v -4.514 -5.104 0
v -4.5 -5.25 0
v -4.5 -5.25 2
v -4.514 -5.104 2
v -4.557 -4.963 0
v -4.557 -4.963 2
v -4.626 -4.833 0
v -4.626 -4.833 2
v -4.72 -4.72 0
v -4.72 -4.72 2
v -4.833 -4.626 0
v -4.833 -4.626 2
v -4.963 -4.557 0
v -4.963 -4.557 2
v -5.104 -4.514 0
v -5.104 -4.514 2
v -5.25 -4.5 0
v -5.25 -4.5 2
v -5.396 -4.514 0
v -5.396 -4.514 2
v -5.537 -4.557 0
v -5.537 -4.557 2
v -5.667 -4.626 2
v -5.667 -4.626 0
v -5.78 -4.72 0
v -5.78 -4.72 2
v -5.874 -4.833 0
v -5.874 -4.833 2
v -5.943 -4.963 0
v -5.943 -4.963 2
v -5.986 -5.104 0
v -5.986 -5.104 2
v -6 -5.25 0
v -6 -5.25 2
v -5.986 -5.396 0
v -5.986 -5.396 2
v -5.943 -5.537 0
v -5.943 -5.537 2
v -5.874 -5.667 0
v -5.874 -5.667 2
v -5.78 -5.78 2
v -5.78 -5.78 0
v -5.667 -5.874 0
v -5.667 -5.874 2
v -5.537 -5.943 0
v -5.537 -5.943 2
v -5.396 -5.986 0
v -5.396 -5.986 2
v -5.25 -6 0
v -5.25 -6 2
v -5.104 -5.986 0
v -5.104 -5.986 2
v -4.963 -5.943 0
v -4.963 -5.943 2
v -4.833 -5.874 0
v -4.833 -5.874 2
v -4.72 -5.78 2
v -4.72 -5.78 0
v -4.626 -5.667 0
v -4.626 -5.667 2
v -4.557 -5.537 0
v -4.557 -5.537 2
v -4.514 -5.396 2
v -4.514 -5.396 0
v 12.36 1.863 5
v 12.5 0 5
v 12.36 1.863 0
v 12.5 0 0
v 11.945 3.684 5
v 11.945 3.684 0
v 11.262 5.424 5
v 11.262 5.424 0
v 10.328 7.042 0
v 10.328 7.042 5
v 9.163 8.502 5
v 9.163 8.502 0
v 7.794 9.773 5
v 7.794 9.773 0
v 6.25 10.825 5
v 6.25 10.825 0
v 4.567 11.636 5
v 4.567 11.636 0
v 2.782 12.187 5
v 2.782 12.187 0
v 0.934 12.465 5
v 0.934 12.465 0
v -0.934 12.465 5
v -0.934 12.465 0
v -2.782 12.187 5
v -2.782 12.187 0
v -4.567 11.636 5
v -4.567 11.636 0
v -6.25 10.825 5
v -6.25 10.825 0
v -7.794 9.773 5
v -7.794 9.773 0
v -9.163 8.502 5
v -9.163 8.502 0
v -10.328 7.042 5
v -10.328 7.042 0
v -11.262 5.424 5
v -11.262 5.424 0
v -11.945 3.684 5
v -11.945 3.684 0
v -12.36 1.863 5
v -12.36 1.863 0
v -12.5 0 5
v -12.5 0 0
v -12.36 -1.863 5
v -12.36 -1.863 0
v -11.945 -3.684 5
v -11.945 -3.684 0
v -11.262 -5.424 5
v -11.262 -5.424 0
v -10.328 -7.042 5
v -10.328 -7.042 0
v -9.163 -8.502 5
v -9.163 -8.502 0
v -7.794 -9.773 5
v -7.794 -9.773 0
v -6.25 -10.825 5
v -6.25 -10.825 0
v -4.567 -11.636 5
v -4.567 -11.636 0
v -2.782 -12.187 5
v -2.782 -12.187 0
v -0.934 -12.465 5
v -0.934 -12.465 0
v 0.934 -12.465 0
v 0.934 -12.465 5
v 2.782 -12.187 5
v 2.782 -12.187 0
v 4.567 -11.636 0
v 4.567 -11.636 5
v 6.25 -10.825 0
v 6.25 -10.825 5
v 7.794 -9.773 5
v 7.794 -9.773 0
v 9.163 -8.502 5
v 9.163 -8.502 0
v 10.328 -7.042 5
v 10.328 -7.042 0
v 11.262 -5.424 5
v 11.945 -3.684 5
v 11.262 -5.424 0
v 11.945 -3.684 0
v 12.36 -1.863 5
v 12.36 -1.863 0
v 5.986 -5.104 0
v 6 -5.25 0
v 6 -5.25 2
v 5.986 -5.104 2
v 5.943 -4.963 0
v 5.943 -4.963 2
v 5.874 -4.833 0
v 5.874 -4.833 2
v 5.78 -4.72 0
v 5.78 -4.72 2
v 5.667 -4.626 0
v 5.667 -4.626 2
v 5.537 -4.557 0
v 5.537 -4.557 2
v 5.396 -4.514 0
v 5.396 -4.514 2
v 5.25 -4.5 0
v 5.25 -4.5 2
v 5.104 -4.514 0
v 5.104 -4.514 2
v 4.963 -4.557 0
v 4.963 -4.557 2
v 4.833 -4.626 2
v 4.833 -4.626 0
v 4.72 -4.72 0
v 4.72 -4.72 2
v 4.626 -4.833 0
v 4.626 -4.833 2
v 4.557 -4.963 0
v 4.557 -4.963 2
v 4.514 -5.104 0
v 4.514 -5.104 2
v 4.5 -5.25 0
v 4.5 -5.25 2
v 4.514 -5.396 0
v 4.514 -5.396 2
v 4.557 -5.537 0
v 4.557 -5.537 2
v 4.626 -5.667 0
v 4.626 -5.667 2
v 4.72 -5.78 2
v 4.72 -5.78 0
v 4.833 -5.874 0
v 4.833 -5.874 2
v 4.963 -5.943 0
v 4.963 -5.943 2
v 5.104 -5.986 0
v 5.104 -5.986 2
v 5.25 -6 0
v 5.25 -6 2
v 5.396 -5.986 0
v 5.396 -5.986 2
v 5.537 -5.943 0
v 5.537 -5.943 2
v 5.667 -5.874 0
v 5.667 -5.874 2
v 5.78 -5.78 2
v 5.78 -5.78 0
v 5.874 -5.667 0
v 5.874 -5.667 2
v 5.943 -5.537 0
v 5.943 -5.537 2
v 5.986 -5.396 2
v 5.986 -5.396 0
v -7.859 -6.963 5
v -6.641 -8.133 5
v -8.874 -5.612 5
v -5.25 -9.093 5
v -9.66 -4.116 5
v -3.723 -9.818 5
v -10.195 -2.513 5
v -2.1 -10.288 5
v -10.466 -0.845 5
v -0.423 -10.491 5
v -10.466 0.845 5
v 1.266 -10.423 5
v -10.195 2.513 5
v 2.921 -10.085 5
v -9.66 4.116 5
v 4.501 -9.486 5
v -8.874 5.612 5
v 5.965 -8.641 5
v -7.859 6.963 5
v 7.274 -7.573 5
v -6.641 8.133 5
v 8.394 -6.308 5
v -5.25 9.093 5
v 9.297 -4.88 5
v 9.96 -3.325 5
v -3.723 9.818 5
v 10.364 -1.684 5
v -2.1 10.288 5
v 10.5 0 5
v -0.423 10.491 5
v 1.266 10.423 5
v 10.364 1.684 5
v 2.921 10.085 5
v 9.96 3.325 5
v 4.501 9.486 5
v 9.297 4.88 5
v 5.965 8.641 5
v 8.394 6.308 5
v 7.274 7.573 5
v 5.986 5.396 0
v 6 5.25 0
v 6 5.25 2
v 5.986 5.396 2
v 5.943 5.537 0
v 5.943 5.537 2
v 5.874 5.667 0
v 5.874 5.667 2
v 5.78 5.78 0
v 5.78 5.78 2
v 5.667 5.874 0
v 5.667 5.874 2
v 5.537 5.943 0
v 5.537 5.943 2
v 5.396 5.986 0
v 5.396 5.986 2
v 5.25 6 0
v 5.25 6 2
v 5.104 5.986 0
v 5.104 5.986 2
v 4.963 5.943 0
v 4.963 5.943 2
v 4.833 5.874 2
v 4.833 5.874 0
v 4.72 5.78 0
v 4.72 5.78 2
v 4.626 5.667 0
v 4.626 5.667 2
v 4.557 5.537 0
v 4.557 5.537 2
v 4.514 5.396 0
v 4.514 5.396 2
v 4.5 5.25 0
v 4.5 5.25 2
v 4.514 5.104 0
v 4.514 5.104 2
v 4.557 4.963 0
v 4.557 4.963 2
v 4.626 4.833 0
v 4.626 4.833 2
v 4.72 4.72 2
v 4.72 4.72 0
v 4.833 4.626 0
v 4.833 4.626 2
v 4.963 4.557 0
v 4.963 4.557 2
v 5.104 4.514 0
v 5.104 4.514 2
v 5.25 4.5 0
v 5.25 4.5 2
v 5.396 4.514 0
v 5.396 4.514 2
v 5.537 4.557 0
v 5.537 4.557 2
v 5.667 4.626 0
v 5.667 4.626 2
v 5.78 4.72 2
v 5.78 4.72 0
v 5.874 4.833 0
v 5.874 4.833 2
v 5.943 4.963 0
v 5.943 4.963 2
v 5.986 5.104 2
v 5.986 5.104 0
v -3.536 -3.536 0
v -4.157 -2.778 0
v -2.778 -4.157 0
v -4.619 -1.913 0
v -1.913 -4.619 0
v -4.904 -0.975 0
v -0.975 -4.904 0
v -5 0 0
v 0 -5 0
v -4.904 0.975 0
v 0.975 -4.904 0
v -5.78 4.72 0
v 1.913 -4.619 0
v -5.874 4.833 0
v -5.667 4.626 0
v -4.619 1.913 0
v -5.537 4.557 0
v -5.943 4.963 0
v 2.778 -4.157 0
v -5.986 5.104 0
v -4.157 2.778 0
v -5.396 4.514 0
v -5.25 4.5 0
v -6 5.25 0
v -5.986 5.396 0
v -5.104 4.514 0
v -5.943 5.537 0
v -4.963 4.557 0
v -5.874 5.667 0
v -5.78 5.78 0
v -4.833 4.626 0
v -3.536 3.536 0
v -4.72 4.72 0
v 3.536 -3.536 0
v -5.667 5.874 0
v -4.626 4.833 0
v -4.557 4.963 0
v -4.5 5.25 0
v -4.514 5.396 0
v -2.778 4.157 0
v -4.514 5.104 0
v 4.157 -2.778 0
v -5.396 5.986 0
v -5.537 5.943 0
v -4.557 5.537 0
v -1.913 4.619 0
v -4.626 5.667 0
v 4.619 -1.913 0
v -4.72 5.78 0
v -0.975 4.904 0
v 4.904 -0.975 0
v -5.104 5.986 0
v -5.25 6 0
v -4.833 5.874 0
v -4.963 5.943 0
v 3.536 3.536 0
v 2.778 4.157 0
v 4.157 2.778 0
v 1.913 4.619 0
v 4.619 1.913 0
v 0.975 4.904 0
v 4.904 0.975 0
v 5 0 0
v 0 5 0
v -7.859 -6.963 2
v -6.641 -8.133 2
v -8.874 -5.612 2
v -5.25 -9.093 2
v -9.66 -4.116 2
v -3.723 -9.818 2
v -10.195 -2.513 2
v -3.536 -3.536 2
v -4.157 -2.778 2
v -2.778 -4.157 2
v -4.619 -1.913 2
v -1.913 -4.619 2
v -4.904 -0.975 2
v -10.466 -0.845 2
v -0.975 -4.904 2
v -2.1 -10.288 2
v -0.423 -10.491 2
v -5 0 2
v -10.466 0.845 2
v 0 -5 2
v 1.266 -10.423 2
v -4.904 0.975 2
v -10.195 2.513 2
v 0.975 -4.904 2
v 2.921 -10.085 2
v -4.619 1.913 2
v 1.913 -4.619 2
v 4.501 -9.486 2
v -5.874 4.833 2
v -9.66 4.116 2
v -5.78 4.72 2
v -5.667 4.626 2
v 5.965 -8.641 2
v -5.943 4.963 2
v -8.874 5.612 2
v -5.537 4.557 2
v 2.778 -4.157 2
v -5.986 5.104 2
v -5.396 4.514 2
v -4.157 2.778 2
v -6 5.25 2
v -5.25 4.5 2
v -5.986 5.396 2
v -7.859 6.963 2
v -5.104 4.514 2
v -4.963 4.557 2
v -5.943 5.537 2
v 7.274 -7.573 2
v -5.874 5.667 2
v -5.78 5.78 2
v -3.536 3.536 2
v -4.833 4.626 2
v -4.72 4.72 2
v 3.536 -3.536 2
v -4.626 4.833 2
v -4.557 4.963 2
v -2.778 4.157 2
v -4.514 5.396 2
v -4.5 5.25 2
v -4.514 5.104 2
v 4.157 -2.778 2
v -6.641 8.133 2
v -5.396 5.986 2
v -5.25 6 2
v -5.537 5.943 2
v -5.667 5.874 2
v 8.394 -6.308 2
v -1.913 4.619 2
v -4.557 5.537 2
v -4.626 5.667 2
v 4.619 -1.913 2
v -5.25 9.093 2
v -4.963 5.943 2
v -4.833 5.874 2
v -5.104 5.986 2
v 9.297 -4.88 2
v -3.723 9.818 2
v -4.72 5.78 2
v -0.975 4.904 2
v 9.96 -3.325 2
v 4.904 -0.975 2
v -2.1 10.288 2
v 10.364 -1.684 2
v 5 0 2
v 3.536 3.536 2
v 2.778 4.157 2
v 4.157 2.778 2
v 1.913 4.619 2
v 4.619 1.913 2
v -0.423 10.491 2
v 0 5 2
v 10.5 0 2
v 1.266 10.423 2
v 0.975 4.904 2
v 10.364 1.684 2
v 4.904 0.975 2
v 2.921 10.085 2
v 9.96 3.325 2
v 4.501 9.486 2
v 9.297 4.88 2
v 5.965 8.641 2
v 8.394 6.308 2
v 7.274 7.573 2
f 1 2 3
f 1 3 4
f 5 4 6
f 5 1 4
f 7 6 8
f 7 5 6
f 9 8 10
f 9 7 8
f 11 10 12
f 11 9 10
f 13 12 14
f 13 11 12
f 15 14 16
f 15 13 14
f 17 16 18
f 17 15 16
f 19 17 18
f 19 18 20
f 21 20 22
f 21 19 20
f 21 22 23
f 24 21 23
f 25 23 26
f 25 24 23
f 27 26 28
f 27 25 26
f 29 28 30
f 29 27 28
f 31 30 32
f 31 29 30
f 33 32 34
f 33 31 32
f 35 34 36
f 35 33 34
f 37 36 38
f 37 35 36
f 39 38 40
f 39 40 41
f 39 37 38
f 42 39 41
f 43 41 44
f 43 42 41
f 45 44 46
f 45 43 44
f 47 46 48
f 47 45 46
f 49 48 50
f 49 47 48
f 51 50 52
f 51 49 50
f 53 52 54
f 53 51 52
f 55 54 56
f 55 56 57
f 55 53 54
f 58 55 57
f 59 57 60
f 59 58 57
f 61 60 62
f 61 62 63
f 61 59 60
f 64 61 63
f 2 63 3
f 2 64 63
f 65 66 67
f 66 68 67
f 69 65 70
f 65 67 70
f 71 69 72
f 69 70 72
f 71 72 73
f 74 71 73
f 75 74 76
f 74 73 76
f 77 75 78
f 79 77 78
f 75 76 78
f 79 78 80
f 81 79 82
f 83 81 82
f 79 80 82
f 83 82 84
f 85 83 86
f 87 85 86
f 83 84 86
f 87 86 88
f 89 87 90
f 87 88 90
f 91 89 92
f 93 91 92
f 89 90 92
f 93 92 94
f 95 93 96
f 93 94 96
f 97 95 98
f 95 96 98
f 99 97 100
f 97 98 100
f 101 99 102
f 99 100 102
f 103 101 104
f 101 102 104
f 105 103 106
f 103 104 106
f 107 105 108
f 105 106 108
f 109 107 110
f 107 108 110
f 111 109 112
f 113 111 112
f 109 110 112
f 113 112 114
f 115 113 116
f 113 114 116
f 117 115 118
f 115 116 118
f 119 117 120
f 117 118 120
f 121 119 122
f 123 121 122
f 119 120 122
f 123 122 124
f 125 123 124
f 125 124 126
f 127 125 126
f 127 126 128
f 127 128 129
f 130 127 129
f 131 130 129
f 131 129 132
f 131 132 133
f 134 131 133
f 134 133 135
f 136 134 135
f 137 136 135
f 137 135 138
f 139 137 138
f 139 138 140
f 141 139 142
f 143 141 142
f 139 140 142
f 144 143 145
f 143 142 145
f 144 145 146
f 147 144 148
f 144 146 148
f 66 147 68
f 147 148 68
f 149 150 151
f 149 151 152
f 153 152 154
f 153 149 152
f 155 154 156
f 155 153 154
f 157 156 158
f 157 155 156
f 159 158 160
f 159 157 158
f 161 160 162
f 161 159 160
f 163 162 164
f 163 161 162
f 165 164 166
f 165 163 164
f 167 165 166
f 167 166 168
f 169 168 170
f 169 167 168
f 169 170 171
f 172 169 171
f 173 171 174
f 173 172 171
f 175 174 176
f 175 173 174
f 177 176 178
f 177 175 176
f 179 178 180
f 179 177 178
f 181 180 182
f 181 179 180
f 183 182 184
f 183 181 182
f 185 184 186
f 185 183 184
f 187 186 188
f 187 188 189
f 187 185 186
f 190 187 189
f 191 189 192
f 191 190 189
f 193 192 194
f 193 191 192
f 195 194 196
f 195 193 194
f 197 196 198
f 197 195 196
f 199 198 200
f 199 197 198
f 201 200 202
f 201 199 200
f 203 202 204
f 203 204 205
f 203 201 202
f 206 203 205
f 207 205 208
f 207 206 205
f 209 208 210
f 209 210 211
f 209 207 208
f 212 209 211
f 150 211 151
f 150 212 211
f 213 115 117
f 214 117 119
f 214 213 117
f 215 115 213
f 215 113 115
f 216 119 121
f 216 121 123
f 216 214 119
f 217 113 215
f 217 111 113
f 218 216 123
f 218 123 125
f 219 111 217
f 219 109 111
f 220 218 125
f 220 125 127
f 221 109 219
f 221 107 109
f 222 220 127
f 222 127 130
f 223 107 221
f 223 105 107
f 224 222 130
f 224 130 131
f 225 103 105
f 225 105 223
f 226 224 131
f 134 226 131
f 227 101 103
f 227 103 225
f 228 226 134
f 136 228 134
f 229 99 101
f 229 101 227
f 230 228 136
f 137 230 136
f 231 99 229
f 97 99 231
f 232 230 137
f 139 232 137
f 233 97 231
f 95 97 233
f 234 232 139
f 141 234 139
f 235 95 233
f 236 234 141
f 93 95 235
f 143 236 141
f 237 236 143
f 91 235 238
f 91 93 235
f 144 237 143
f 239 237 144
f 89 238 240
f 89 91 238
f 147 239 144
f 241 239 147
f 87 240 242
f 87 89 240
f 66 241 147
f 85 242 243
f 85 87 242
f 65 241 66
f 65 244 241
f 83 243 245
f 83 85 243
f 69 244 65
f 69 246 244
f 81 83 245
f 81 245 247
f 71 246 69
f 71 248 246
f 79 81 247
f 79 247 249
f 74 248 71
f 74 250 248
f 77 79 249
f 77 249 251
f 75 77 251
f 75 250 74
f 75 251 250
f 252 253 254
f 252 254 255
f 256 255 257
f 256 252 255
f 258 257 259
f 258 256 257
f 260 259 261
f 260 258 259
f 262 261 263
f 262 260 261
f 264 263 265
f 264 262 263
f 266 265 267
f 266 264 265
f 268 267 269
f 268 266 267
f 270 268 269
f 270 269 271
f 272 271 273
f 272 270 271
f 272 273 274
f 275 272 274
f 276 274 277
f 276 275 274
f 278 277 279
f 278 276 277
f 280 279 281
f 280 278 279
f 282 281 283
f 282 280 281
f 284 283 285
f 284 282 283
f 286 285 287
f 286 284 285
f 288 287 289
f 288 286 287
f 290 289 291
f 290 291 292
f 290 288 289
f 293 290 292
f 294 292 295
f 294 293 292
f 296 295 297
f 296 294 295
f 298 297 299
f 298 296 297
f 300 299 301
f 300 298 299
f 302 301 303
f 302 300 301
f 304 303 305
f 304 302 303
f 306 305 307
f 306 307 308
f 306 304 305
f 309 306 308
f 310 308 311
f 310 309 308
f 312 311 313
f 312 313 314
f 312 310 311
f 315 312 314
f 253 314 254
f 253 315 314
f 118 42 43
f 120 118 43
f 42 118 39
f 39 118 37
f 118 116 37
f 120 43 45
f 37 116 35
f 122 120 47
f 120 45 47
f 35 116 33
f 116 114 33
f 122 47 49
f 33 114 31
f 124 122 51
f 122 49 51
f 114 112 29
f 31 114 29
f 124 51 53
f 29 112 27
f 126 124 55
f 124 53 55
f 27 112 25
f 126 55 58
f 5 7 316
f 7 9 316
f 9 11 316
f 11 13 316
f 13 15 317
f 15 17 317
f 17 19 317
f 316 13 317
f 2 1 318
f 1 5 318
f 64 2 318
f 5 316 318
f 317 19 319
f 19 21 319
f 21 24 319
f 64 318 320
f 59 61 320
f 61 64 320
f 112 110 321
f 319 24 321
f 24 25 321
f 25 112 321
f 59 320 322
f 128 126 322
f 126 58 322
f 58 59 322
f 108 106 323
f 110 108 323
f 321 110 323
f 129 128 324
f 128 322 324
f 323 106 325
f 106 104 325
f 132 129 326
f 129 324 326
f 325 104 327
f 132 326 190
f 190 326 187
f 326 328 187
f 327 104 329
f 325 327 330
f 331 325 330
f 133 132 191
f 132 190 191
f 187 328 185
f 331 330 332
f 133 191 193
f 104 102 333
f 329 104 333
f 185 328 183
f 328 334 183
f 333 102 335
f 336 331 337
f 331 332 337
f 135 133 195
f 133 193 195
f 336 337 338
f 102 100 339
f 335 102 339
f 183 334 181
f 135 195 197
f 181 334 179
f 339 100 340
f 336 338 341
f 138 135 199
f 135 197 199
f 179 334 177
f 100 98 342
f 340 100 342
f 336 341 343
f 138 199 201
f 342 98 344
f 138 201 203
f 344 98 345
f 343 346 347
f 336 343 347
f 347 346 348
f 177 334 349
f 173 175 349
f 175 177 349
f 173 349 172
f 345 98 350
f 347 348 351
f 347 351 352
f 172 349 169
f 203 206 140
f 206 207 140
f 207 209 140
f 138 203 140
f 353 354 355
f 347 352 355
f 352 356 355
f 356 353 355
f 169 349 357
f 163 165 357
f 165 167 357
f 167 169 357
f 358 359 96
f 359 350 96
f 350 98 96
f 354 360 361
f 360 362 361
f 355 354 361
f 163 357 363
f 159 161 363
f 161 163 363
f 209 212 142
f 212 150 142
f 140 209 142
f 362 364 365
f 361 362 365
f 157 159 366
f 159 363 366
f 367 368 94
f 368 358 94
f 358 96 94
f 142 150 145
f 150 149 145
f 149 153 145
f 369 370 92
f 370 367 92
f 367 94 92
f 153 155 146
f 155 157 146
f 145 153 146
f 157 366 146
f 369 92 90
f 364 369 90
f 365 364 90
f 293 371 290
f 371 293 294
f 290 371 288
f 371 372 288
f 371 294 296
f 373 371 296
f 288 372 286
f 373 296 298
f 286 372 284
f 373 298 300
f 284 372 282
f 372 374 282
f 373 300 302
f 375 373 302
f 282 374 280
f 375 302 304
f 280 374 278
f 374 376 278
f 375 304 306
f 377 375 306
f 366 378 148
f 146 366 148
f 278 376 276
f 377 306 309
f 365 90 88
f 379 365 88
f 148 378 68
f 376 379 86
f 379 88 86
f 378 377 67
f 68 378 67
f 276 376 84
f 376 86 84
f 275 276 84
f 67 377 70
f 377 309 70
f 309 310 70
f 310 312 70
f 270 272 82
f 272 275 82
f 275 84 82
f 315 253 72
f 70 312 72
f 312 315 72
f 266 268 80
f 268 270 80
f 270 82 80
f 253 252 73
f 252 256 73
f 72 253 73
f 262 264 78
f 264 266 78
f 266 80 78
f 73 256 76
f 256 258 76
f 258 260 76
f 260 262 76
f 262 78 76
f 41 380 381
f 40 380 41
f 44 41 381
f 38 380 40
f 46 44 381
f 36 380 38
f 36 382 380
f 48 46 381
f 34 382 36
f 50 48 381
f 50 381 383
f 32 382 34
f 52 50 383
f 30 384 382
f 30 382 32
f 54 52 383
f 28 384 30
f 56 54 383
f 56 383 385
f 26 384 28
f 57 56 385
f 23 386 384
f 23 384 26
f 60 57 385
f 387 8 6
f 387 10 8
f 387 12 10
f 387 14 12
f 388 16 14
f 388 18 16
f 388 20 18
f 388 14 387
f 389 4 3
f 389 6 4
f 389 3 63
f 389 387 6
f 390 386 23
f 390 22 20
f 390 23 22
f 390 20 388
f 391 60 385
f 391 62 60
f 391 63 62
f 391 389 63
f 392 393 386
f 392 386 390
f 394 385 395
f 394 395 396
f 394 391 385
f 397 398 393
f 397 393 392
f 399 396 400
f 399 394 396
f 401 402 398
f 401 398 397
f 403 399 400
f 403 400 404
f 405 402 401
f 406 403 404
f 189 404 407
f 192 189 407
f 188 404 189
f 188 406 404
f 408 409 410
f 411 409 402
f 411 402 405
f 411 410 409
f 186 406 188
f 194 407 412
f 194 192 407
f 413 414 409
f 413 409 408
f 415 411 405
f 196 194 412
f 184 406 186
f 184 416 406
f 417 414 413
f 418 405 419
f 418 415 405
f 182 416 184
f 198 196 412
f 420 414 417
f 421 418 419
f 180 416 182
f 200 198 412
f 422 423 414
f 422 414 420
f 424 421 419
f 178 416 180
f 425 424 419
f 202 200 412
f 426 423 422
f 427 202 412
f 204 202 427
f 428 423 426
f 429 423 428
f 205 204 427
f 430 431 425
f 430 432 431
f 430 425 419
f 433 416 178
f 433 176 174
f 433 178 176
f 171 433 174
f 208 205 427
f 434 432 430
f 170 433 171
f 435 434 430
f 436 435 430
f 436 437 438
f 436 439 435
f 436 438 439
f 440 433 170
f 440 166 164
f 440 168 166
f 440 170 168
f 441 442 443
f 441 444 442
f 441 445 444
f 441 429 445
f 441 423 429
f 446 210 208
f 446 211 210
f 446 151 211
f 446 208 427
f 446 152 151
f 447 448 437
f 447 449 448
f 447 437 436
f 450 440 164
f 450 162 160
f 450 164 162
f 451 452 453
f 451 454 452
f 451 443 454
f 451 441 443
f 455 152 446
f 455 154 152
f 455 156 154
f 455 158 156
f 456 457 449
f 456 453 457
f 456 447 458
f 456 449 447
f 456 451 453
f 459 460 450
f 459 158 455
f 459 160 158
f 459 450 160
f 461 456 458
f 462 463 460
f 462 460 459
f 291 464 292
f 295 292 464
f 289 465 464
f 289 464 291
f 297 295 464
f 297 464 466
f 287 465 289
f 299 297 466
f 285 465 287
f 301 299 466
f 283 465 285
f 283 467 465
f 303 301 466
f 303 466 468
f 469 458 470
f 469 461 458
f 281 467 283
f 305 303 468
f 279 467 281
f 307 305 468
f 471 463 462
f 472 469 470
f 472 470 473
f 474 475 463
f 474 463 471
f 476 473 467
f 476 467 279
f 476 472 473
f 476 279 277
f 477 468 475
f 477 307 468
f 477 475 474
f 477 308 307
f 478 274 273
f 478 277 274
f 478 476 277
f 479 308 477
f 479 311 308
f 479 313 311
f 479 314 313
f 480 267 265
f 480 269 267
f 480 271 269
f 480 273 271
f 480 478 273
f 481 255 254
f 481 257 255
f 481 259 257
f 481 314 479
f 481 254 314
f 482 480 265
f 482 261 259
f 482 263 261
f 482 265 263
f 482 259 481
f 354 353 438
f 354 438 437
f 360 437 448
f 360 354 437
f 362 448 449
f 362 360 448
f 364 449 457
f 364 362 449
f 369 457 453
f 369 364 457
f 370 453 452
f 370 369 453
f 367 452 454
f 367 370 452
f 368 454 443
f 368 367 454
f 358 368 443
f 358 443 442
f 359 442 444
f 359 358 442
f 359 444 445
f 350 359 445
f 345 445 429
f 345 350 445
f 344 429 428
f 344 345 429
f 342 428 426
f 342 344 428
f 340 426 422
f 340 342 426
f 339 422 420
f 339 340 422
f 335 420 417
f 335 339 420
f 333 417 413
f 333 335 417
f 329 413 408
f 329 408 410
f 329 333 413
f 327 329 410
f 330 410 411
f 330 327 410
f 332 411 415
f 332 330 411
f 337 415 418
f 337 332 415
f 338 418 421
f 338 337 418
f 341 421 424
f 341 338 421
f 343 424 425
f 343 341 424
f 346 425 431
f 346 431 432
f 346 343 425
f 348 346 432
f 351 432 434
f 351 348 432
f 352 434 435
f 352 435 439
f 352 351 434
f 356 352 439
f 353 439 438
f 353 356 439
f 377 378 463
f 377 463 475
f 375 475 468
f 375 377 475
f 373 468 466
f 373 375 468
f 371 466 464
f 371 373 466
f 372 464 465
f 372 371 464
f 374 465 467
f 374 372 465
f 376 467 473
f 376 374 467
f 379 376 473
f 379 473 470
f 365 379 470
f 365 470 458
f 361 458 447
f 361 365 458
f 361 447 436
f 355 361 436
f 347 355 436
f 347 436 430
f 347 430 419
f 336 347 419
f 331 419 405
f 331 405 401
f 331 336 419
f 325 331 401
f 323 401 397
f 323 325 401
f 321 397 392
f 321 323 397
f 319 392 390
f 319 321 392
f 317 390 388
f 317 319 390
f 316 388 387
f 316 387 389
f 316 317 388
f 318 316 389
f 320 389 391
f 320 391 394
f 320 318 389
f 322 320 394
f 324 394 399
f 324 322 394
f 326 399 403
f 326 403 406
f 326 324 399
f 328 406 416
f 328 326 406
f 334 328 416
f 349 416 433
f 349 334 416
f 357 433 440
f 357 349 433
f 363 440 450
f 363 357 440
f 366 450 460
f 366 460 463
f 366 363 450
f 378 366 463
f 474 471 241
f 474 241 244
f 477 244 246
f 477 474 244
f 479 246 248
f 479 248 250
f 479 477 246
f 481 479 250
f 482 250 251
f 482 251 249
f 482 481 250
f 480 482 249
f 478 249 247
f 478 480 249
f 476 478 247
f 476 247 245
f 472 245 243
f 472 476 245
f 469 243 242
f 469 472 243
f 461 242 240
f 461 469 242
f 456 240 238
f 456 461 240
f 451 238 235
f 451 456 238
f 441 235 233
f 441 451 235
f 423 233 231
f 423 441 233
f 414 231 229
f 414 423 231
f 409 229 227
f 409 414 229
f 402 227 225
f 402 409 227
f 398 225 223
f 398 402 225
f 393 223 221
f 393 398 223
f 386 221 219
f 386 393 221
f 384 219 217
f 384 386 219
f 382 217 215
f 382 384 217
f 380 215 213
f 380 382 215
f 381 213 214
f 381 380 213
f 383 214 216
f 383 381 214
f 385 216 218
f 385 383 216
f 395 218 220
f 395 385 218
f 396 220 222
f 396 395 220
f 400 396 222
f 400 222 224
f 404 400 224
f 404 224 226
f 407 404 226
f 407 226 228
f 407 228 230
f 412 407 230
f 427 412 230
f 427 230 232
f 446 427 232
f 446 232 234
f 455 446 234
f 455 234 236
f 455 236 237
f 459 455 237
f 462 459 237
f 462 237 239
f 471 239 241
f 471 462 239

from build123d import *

# Parameters (mm, degrees)
ESQUISSE1_R        = 12.5
ESQUISSE1_R_2      = 5
ESQUISSE1_R_3      = 0.75
BOSS_EXTRU_1_DEPTH = 2
ESQUISSE2_R        = 12.5
ESQUISSE2_R_2      = 10.5
BOSS_EXTRU_2_DEPTH = 3


with BuildPart() as part:
    # Esquisse1 → Boss.-Extru.1 (new body)
    with BuildSketch(Plane.XY):
        Circle(ESQUISSE1_R)
        Circle(ESQUISSE1_R_2, mode=Mode.SUBTRACT)
        with Locations((-5.25, 5.25)):
            Circle(ESQUISSE1_R_3, mode=Mode.SUBTRACT)
        with Locations((5.25, 5.25)):
            Circle(ESQUISSE1_R_3, mode=Mode.SUBTRACT)
        with Locations((5.25, -5.25)):
            Circle(ESQUISSE1_R_3, mode=Mode.SUBTRACT)
        with Locations((-5.25, -5.25)):
            Circle(ESQUISSE1_R_3, mode=Mode.SUBTRACT)
    extrude(amount=BOSS_EXTRU_1_DEPTH)

    # Esquisse2 → Boss.-Extru.2 (add)
    with BuildSketch(Plane.XY.offset(2)):
        Circle(ESQUISSE2_R)
        Circle(ESQUISSE2_R_2, mode=Mode.SUBTRACT)
    extrude(amount=BOSS_EXTRU_2_DEPTH)


solid = part.part
